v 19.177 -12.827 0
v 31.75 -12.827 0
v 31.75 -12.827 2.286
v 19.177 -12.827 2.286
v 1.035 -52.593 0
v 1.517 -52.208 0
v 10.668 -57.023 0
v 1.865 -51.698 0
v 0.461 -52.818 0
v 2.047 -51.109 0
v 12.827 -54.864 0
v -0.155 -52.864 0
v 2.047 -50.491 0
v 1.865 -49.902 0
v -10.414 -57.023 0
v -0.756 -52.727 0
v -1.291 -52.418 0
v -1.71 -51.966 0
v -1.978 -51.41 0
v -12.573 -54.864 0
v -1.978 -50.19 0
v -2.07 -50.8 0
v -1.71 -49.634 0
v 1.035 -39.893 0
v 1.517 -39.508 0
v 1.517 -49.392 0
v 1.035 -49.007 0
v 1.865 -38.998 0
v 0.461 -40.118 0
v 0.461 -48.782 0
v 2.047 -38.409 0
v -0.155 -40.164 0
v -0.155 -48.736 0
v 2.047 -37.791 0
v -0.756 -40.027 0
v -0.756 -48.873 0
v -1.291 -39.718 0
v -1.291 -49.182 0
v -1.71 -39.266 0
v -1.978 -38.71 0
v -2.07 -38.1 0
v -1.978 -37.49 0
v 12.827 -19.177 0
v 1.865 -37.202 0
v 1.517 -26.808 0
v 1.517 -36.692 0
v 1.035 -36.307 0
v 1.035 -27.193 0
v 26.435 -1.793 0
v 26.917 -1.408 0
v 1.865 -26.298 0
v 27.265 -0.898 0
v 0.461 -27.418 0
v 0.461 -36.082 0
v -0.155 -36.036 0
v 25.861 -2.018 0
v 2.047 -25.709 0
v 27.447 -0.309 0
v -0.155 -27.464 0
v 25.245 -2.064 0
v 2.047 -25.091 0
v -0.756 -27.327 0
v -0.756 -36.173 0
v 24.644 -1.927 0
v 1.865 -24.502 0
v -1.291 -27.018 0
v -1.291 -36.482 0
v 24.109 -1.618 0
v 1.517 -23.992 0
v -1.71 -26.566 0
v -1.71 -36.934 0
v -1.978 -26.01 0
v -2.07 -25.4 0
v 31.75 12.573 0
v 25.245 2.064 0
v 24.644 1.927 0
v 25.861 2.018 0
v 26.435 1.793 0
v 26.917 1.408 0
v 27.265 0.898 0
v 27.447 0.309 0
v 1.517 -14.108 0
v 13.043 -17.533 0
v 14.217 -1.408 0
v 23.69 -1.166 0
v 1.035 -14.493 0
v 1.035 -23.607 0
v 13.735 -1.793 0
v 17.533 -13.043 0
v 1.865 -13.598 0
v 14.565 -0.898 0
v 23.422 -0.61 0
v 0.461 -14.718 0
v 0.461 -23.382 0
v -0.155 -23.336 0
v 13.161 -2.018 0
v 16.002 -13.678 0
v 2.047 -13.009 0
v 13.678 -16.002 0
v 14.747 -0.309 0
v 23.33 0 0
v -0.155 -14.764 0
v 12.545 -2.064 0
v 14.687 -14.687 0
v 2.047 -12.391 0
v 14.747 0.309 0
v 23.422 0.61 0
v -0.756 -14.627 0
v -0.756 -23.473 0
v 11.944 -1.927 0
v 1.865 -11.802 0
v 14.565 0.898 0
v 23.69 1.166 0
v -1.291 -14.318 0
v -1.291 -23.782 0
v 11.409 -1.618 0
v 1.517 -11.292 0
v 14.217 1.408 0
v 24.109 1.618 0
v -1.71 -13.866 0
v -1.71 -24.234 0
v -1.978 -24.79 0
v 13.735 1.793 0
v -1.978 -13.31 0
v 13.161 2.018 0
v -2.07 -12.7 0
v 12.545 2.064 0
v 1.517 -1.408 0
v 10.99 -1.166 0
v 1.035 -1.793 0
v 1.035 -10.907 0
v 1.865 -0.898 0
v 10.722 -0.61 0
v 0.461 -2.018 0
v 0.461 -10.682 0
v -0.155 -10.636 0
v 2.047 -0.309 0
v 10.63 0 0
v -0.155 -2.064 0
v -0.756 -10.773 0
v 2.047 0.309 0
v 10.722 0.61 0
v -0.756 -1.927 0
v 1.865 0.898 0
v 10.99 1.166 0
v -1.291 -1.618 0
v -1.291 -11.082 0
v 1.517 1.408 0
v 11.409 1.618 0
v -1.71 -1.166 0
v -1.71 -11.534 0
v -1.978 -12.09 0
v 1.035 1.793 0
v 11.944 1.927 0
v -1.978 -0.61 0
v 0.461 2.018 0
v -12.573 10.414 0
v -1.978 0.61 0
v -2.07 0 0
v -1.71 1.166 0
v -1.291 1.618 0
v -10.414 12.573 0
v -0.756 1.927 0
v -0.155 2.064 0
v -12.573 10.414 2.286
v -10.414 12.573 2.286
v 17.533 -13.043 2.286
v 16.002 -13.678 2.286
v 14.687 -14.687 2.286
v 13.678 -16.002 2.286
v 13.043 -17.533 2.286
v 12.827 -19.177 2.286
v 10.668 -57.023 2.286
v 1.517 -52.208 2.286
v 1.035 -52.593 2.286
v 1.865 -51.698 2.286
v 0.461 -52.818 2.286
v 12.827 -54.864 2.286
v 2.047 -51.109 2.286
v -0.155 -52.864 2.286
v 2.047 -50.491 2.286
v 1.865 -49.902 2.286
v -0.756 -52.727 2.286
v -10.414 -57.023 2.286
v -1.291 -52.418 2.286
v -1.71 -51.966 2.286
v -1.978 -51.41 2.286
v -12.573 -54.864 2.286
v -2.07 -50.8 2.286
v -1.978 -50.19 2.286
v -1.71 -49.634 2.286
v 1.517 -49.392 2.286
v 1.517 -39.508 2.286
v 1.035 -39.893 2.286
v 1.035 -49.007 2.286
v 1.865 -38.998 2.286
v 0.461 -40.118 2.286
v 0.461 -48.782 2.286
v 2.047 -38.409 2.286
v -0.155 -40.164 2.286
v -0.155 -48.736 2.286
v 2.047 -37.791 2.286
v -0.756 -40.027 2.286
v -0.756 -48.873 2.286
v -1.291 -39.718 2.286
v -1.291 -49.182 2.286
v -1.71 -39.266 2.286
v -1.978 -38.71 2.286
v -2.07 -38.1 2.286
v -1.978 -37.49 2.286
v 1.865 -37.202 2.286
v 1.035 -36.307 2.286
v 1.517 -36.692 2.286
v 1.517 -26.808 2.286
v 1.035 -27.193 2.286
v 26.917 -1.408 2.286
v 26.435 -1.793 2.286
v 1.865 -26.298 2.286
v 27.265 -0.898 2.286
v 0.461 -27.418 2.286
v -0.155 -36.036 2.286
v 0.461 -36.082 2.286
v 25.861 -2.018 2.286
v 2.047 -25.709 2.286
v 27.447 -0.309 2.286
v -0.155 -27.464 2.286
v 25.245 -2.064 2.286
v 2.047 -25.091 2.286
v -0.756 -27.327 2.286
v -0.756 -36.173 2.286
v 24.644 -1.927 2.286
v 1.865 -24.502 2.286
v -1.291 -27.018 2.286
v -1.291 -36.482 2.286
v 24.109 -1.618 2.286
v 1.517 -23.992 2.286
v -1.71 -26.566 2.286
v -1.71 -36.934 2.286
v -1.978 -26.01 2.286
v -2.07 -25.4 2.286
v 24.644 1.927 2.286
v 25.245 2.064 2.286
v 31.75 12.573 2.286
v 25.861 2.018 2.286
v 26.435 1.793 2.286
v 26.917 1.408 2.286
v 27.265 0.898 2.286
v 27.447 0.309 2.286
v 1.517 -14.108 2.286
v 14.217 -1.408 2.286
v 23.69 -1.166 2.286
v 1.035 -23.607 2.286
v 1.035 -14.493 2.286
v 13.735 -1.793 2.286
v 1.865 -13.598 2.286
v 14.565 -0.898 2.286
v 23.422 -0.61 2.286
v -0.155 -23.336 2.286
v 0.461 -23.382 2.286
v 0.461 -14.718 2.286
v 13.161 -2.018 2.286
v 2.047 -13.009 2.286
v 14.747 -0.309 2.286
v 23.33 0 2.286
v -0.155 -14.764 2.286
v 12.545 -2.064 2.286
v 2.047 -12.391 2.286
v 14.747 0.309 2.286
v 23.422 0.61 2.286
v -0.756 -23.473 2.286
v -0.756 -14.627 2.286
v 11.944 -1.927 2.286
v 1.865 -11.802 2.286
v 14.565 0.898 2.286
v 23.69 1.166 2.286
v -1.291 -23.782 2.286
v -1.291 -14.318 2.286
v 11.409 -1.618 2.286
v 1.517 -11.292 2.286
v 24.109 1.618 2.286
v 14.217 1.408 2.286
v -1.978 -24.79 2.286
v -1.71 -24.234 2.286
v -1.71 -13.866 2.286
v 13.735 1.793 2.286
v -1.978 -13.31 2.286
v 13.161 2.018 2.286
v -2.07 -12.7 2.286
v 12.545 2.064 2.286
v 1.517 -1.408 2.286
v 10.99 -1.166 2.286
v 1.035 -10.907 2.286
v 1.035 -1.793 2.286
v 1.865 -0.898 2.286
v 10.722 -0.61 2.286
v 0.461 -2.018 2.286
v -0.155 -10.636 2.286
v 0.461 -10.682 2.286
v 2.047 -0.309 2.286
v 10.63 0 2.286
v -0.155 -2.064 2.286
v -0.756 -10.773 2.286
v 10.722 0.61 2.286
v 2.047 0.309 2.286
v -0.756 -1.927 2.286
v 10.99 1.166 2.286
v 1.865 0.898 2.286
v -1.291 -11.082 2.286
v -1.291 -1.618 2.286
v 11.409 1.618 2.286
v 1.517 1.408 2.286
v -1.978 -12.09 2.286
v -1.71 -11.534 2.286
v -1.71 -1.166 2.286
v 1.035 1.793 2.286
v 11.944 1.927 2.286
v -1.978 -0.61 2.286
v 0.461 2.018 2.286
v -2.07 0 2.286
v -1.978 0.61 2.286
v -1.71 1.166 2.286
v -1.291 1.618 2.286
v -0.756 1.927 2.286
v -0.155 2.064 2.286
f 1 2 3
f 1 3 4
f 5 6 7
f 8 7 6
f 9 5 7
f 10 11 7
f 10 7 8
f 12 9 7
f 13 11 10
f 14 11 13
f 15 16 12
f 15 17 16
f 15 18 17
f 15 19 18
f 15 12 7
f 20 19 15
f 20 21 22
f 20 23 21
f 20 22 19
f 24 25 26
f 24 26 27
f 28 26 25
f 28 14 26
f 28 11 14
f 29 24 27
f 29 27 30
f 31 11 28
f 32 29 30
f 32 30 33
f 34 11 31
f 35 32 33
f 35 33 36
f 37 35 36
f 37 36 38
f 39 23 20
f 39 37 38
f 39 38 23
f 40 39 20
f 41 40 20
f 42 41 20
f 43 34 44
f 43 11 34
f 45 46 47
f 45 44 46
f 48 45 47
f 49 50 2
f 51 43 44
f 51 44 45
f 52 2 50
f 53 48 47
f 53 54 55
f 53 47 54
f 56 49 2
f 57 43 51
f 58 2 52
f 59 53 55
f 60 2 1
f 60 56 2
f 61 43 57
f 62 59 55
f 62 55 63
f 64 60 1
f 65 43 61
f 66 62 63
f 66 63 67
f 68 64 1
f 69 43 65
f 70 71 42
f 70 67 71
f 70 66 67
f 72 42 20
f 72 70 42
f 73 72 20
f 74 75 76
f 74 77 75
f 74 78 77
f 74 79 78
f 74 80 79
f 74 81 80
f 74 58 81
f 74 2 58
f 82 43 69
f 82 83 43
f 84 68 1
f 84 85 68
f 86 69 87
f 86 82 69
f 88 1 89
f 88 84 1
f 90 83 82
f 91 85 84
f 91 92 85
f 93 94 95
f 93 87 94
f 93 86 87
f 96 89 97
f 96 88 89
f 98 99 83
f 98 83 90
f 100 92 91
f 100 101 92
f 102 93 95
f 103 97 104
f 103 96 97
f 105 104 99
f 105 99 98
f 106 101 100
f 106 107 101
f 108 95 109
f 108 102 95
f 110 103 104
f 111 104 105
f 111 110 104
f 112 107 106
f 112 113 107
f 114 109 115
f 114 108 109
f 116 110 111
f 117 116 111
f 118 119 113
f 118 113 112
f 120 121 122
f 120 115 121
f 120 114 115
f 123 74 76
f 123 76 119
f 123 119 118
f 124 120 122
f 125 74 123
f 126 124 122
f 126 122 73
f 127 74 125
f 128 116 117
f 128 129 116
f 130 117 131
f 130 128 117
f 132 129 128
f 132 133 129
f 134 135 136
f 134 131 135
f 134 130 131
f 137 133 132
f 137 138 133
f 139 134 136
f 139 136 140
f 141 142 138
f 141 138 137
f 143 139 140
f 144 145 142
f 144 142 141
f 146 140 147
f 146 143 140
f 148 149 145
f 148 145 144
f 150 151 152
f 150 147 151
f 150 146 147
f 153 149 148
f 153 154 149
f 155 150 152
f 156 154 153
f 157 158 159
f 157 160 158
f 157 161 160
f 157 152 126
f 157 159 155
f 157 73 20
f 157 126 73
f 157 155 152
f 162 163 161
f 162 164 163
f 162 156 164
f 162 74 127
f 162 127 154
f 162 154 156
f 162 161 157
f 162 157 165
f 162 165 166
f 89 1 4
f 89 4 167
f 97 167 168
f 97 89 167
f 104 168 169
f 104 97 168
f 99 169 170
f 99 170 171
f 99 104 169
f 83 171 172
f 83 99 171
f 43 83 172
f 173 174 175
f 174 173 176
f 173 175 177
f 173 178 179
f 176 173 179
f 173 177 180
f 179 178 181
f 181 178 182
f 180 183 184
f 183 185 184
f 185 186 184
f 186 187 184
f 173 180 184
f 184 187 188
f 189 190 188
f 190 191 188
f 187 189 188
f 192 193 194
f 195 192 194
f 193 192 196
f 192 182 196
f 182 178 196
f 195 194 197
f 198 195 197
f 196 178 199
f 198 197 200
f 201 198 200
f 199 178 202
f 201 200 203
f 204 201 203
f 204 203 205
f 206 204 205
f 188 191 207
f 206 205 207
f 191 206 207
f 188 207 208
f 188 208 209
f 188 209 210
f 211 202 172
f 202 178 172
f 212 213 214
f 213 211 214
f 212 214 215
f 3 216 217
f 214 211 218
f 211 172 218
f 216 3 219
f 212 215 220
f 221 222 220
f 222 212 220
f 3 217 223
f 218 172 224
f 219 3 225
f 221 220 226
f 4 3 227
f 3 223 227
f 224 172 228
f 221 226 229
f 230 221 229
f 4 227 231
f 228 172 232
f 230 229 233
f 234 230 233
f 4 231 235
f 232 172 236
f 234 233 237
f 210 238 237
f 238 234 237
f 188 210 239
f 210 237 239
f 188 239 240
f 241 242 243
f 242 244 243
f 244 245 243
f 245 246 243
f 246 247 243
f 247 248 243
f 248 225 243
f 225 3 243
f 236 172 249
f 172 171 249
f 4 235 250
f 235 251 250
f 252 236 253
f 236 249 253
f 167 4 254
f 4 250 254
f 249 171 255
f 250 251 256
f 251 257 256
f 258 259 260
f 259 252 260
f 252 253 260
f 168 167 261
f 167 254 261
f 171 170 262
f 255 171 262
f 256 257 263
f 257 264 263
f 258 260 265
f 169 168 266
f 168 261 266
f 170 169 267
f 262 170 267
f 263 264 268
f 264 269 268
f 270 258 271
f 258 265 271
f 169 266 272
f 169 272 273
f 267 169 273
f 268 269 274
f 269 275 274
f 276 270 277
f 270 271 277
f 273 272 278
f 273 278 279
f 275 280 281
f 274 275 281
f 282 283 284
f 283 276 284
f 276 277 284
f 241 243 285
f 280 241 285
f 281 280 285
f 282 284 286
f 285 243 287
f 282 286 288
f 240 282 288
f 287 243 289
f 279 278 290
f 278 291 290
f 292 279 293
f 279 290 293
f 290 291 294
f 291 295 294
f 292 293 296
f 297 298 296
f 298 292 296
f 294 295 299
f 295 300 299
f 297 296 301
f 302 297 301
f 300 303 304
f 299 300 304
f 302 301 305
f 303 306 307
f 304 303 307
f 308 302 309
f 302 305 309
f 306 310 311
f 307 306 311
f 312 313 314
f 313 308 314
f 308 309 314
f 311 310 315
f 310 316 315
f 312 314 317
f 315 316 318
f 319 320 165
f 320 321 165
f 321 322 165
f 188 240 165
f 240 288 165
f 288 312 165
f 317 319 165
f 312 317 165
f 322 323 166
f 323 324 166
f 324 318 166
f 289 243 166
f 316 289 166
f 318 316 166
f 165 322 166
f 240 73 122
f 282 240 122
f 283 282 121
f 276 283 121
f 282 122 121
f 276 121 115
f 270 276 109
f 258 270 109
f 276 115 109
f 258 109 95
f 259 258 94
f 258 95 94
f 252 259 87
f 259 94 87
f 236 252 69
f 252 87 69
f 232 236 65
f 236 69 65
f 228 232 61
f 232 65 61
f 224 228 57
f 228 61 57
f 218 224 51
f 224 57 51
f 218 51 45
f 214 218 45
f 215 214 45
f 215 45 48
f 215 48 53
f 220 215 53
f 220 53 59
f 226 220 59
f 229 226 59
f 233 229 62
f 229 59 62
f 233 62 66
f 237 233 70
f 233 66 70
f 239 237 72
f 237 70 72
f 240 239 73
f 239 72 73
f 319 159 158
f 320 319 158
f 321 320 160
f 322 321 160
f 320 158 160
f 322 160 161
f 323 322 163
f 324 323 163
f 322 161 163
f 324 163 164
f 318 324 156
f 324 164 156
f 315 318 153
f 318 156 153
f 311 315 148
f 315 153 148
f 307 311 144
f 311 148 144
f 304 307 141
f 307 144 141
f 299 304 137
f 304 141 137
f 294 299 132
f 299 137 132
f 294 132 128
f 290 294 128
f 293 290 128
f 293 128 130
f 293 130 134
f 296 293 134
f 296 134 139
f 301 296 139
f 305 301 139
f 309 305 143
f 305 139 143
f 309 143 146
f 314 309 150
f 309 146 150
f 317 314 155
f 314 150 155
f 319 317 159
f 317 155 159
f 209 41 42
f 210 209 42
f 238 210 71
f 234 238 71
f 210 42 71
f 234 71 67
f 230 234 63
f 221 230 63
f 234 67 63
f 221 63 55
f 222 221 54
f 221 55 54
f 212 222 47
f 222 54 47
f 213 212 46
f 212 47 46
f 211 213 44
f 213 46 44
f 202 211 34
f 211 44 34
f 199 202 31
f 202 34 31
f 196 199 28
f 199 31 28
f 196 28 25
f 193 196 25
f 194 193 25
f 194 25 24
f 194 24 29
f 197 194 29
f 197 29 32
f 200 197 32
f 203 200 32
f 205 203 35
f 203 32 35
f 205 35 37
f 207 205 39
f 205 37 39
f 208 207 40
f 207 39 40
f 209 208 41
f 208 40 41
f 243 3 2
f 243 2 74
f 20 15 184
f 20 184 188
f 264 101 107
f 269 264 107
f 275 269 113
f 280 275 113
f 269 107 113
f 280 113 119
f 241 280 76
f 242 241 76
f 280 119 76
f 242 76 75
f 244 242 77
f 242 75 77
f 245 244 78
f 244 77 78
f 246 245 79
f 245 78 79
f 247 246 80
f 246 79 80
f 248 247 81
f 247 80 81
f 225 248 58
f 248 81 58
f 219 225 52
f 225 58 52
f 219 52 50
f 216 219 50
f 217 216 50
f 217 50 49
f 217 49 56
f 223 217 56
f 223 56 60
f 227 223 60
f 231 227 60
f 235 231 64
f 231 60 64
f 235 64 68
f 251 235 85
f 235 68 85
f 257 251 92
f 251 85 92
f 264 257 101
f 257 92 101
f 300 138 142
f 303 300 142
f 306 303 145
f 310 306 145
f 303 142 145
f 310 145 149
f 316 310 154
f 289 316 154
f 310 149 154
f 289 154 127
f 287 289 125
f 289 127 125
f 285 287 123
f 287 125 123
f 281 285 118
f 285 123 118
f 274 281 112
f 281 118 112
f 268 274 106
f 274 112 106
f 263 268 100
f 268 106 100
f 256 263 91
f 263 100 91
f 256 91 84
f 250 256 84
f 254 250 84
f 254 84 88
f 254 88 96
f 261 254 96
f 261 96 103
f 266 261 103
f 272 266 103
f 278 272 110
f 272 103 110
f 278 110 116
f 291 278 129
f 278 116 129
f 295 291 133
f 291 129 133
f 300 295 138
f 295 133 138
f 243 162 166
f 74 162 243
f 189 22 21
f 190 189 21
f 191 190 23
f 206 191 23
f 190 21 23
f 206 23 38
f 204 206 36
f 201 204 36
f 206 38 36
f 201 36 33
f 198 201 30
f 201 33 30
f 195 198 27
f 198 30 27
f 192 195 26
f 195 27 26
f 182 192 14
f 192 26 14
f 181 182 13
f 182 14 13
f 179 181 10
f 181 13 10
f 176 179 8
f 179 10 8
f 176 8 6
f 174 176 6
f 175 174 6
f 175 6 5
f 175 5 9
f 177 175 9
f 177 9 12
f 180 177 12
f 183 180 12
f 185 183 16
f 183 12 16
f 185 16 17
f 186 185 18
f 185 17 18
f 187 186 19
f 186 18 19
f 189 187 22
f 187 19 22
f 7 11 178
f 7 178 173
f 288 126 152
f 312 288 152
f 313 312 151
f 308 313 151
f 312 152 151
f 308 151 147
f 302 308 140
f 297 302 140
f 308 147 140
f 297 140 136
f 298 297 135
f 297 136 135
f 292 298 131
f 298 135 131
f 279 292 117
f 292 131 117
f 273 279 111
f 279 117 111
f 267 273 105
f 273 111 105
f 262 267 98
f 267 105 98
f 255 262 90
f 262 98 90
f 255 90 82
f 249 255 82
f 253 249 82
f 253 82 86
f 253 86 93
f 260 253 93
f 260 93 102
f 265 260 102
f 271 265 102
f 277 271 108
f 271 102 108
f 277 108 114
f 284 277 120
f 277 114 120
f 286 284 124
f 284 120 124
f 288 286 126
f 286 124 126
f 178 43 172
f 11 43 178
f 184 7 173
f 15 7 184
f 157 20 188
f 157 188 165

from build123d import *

# Parameters (mm, degrees)
SKETCH1_R               = 2.0701
BOSS_EXTRUDE1_DEPTH     = 2.286
SKETCH2_W               = 25.273
SKETCH2_H               = 25.4
CUT_EXTRUDE1_DEPTH      = 1
CUT_EXTRUDE1_DEPTH_BACK = 3.286


with BuildPart() as part:
    # Sketch1 → Boss-Extrude1 (new body)
    with BuildSketch(Plane(origin=(0, 0, 0), x_dir=(-1, 0, 0), z_dir=(0, 0, -1))):
        with BuildLine():
            Line((10.414, 12.573), (-54.864, 12.573))
            Line((-54.864, 12.573), (-57.023, 10.414))
            Line((-57.023, 10.414), (-57.023, -10.668))
            Line((-57.023, -10.668), (-54.864, -12.827))
            Line((-54.864, -12.827), (-19.177, -12.827))
            ThreePointArc((-19.177, -12.827), (-14.686871939, -14.686871939), (-12.827, -19.177))
            Line((-12.827, -19.177), (-12.827, -54.864))
            Line((-12.827, -54.864), (-10.668, -57.023))
            Line((-10.668, -57.023), (10.414, -57.023))
            Line((10.414, -57.023), (12.573, -54.864))
            Line((12.573, -54.864), (12.573, 10.414))
            Line((12.573, 10.414), (10.414, 12.573))
        make_face()
        with Locations((0, -50.8)):
            Circle(SKETCH1_R, mode=Mode.SUBTRACT)
        with Locations((0, -25.4)):
            Circle(SKETCH1_R, mode=Mode.SUBTRACT)
        with Locations((-38.1, 0)):
            Circle(SKETCH1_R, mode=Mode.SUBTRACT)
        with Locations((-12.7, 0)):
            Circle(SKETCH1_R, mode=Mode.SUBTRACT)
        Circle(SKETCH1_R, mode=Mode.SUBTRACT)
        with Locations((-25.4, 0)):
            Circle(SKETCH1_R, mode=Mode.SUBTRACT)
        with Locations((0, -12.7)):
            Circle(SKETCH1_R, mode=Mode.SUBTRACT)
        with Locations((0, -38.1)):
            Circle(SKETCH1_R, mode=Mode.SUBTRACT)
        with Locations((-50.8, 0)):
            Circle(SKETCH1_R, mode=Mode.SUBTRACT)
    extrude(amount=-BOSS_EXTRUDE1_DEPTH)

    # Sketch2 → Cut-Extrude1 (cut, two sides)
    with BuildSketch(Plane.XY.offset(2.286)) as cut_extrude1_sk:
        with Locations((44.3865, -0.127)):
            Rectangle(SKETCH2_W, SKETCH2_H)
    extrude(amount=CUT_EXTRUDE1_DEPTH, mode=Mode.SUBTRACT)
    extrude(cut_extrude1_sk.sketch, amount=-CUT_EXTRUDE1_DEPTH_BACK, mode=Mode.SUBTRACT)


solid = part.part
